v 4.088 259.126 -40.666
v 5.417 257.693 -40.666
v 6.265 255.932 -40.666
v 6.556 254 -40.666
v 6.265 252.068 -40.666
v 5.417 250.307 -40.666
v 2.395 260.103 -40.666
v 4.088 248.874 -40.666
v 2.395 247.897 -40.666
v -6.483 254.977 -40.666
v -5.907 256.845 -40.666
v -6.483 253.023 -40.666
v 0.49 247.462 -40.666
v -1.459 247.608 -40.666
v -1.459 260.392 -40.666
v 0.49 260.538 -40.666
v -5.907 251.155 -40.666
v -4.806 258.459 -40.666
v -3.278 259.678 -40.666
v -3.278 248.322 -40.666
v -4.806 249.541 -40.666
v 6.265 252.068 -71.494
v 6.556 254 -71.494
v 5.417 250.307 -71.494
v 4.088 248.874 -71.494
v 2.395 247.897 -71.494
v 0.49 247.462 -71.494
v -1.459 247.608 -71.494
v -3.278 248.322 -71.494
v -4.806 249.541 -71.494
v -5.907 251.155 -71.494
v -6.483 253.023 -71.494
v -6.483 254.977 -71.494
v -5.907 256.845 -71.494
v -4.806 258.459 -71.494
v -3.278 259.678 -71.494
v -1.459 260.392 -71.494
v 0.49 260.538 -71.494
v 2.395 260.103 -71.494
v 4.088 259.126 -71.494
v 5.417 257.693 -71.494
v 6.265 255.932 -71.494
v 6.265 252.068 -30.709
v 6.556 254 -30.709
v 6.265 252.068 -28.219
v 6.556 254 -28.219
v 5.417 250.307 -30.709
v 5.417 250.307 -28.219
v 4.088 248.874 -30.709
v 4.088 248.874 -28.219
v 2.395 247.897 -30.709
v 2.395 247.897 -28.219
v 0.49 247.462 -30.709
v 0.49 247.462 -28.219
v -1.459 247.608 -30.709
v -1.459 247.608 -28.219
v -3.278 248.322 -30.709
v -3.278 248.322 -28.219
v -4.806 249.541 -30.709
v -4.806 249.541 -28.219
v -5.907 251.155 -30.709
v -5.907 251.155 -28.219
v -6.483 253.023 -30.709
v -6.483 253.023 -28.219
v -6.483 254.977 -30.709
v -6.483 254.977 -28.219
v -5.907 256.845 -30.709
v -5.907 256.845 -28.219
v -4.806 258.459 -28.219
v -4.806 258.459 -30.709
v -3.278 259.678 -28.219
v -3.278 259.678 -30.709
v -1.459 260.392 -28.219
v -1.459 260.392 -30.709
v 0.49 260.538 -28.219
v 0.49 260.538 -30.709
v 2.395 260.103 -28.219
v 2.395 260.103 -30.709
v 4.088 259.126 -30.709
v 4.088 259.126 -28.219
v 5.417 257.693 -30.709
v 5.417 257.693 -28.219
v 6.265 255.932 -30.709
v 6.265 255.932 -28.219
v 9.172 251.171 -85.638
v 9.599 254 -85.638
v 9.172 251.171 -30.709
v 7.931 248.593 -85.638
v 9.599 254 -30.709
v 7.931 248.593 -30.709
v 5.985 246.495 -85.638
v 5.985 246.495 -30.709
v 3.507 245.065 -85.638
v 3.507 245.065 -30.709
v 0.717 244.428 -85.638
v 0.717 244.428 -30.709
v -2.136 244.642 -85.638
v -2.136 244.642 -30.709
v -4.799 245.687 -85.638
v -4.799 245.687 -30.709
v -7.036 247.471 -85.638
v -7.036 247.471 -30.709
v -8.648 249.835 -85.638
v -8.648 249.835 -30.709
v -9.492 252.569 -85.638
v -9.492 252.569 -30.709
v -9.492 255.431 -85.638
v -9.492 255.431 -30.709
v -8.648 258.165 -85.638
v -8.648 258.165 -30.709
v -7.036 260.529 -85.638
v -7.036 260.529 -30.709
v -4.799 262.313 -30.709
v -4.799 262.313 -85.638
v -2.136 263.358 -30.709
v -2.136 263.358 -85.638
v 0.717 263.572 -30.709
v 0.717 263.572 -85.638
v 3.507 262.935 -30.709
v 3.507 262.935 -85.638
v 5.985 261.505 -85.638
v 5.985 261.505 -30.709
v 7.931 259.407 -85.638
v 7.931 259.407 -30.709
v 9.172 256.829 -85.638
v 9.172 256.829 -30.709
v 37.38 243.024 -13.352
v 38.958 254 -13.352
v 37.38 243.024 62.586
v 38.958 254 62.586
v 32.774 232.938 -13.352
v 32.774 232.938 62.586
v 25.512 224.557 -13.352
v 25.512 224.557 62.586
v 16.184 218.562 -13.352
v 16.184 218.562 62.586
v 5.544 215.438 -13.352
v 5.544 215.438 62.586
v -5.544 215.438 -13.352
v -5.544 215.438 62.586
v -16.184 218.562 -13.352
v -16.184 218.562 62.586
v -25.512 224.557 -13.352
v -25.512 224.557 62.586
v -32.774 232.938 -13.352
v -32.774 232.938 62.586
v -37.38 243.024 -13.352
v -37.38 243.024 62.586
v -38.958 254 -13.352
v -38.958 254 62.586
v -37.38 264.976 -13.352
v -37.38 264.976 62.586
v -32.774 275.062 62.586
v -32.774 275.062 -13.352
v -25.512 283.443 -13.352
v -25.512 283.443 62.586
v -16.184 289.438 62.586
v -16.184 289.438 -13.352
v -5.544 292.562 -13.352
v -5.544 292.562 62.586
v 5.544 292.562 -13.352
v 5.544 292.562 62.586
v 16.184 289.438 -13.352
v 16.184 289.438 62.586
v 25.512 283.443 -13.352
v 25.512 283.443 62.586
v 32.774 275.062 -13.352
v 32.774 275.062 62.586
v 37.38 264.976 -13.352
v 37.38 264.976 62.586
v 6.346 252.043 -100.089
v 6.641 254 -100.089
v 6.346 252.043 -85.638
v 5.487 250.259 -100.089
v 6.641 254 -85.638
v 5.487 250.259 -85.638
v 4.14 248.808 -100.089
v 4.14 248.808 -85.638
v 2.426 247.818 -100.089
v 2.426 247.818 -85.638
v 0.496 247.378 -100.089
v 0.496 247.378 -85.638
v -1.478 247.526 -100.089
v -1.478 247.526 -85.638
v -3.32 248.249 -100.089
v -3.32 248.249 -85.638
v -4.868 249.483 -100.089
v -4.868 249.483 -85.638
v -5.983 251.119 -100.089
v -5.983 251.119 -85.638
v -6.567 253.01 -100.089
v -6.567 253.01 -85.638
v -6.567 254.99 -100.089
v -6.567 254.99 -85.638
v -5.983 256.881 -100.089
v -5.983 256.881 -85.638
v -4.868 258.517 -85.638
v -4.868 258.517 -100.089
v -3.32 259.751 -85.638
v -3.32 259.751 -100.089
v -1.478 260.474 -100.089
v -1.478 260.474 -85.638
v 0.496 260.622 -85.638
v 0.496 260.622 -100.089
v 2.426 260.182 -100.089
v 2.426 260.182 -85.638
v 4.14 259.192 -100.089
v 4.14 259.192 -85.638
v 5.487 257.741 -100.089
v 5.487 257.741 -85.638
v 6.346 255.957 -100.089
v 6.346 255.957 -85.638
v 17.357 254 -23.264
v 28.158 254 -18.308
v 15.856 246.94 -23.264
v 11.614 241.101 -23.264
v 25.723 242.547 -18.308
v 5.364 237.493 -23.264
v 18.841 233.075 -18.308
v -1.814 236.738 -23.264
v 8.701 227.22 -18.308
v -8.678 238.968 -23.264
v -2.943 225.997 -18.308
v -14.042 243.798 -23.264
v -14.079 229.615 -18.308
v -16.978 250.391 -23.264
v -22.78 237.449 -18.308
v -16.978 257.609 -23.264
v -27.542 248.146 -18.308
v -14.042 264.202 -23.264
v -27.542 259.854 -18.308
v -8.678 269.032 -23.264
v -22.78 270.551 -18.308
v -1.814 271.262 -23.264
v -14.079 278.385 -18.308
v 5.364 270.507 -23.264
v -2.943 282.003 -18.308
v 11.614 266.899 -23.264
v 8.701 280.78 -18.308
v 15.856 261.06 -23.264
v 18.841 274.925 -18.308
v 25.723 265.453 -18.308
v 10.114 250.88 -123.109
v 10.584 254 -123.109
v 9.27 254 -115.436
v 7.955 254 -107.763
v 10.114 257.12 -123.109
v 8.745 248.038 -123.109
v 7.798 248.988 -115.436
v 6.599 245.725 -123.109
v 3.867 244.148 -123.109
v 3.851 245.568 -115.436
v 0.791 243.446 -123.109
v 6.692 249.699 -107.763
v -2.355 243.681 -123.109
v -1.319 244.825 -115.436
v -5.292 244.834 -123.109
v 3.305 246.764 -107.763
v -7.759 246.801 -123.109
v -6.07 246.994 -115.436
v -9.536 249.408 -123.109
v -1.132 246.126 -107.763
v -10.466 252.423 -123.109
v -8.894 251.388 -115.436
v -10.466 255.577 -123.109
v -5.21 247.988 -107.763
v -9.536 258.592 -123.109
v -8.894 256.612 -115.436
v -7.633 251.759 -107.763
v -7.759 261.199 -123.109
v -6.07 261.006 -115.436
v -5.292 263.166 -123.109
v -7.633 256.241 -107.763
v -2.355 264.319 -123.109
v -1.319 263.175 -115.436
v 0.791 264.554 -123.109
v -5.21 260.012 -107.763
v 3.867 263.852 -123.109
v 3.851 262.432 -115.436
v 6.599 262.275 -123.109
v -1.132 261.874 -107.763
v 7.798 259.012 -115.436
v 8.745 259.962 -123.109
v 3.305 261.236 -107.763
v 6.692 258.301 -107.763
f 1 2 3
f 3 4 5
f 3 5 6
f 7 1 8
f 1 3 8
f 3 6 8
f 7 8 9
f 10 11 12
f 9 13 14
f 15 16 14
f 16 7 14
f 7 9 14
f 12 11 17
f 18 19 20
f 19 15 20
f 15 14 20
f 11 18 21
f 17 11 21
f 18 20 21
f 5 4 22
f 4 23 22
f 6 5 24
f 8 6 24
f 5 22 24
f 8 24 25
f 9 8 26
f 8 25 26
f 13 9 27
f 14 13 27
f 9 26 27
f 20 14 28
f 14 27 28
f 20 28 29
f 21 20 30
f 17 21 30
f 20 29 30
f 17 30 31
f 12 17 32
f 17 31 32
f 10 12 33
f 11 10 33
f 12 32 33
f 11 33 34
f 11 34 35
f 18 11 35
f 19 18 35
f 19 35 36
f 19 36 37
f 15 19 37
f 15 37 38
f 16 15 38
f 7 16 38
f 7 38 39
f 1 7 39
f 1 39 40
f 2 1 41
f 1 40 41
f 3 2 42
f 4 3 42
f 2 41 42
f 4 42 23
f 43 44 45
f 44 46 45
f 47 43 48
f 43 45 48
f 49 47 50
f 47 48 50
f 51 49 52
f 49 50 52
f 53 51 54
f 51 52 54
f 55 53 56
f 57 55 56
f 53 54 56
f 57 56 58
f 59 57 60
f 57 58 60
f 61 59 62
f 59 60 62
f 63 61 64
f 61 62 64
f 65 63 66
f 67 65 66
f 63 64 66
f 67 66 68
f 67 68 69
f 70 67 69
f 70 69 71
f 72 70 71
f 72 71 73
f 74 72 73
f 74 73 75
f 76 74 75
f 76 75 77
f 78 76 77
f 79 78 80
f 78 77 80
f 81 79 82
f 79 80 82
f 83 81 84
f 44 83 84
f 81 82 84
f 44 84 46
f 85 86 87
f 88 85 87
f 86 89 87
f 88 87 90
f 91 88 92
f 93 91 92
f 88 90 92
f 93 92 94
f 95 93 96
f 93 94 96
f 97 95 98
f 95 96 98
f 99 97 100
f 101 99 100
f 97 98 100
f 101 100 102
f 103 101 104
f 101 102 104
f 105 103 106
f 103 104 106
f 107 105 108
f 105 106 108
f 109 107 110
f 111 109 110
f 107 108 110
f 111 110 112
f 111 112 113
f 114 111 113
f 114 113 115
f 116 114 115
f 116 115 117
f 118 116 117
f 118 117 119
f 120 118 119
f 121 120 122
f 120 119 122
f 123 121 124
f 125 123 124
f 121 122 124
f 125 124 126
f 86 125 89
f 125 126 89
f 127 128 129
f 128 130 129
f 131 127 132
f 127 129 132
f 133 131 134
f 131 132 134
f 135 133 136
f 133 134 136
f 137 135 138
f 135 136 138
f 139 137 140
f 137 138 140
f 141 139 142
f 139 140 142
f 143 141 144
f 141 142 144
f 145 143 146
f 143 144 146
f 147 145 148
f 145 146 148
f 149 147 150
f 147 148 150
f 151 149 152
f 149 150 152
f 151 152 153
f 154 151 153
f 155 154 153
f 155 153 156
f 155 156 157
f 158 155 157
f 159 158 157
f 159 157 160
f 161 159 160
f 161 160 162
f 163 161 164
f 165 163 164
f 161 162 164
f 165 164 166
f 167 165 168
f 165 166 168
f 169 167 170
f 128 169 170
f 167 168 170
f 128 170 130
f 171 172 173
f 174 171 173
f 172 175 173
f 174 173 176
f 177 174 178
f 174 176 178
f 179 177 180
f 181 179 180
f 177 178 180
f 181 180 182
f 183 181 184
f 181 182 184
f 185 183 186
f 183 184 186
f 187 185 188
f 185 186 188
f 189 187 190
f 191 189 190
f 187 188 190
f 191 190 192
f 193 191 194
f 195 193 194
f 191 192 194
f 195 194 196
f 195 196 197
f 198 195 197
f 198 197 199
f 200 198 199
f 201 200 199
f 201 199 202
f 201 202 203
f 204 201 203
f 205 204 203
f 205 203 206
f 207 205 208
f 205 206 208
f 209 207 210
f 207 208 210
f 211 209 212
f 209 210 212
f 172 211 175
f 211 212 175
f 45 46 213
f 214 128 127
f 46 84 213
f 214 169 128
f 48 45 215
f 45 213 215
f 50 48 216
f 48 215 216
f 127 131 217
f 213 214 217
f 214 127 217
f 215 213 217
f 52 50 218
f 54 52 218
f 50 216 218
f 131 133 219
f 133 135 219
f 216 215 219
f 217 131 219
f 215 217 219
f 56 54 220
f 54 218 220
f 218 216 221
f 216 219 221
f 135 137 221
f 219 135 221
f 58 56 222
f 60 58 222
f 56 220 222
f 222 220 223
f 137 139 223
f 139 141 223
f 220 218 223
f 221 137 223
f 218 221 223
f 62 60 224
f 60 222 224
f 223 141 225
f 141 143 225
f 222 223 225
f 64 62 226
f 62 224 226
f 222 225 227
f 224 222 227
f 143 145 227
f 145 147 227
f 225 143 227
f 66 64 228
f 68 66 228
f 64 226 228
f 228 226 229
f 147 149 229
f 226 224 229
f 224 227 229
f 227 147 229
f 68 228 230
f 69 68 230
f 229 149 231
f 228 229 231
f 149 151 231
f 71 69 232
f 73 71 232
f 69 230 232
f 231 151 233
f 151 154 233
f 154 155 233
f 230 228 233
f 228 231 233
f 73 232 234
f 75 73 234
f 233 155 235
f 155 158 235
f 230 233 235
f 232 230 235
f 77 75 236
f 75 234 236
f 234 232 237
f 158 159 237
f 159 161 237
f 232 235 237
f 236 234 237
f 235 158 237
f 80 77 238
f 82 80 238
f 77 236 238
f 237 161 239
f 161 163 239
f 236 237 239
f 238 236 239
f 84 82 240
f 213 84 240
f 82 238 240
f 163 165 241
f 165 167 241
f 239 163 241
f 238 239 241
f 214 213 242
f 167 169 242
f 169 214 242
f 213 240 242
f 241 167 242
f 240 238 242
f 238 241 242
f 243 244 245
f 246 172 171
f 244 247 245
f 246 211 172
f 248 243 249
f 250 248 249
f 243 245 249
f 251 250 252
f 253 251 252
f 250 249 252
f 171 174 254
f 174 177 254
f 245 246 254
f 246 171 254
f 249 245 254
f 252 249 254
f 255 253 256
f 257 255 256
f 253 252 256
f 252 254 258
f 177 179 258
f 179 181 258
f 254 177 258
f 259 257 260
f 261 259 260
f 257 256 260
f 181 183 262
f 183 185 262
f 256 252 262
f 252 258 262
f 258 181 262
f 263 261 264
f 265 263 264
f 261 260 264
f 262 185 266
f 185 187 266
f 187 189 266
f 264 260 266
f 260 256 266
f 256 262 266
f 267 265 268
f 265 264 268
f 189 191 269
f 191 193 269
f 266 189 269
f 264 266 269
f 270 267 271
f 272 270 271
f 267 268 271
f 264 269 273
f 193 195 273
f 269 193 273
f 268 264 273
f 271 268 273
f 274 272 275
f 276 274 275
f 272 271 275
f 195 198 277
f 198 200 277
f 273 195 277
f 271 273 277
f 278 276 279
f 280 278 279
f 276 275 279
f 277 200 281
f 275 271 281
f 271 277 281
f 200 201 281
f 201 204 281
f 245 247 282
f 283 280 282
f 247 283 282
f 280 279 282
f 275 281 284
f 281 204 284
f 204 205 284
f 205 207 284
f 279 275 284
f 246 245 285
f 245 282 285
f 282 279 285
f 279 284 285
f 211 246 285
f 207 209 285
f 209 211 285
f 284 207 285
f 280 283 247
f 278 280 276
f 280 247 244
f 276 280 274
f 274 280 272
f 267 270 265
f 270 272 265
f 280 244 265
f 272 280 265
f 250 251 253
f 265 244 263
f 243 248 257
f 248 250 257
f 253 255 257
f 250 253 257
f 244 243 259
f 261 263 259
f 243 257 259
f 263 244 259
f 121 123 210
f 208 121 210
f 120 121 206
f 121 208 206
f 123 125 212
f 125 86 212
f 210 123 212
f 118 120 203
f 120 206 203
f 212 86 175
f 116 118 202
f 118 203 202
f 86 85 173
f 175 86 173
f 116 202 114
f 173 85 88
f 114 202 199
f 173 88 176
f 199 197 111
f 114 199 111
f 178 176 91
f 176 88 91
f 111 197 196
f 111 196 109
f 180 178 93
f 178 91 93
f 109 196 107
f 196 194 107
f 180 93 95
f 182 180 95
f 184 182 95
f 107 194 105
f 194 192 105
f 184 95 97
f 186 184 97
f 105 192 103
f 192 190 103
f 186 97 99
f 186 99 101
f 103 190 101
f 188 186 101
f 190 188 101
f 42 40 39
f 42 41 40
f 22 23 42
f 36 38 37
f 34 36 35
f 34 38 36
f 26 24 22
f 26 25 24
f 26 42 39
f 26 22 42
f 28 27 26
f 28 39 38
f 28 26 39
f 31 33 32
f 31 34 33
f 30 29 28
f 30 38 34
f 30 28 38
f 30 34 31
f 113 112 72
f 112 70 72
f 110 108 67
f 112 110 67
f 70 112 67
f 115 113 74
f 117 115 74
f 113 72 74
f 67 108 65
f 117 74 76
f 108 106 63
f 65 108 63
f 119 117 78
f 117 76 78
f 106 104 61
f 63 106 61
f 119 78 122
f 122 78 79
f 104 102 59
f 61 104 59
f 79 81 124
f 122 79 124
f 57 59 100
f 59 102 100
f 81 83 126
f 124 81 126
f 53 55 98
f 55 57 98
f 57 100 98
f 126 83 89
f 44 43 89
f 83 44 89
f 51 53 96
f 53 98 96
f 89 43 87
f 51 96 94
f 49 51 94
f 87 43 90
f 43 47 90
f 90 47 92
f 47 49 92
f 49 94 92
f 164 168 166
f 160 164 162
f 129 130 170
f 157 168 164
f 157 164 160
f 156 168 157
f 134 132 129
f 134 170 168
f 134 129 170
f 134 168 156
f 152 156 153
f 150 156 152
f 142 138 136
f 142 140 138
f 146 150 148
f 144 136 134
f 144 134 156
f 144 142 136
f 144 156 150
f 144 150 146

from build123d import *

# Parameters (mm, degrees)
F0_W   = 38.9583557844
F0_H   = 75.9382499057
F0_W_2 = 6.5562282689
F0_H_2 = 11.2140998244
F0_W_3 = 6.6408021376
F0_H_3 = 14.4509151578


with BuildPart() as f1:
    # F0 (on Front) → F1 (revolve)
    with BuildSketch(Plane.XZ):
        with Locations((19.4791778922, 24.6171006164)):
            Rectangle(F0_W, F0_H)
        Polygon((38.9583557844, -13.3520243364), (0, -13.3520243364), (0, -28.2193049788), (6.5562282689, -28.2193049788), align=None)
        Polygon((6.5562282689, -28.2193049788), (0, -28.2193049788), (0, -40.6660549343), (6.5562282689, -40.6660549343), (6.5562282689, -30.708655715), align=None)
        Polygon((9.5987673849, -30.708655715), (6.5562282689, -30.708655715), (6.5562282689, -40.6660549343), (6.5562282689, -71.4942961931), (6.5562282689, -82.7083960176), (9.5987673849, -82.7083960176), align=None)
        with Locations((3.2781141344, -77.1013461053)):
            Rectangle(F0_W_2, F0_H_2)
        Polygon((6.5562282689, -82.7083960176), (0, -82.7083960176), (0, -85.6381952763), (6.6408021376, -85.6381952763), (9.5987673849, -85.6381952763), (9.5987673849, -82.7083960176), align=None)
        with Locations((3.3204010688, -92.8636528552)):
            Rectangle(F0_W_3, F0_H_3)
        Polygon((6.6408021376, -100.0891104341), (0, -100.0891104341), (0, -123.1093853712), (10.5840368196, -123.1093853712), align=None)
    revolve(axis=Axis((0, 0, -39.0329621732), (0, 0, -1)))


with BuildPart() as f1_1:
    # F2: moved
    add(f1.part.moved(Location((0, 254, 0))))


solid = f1_1.part
